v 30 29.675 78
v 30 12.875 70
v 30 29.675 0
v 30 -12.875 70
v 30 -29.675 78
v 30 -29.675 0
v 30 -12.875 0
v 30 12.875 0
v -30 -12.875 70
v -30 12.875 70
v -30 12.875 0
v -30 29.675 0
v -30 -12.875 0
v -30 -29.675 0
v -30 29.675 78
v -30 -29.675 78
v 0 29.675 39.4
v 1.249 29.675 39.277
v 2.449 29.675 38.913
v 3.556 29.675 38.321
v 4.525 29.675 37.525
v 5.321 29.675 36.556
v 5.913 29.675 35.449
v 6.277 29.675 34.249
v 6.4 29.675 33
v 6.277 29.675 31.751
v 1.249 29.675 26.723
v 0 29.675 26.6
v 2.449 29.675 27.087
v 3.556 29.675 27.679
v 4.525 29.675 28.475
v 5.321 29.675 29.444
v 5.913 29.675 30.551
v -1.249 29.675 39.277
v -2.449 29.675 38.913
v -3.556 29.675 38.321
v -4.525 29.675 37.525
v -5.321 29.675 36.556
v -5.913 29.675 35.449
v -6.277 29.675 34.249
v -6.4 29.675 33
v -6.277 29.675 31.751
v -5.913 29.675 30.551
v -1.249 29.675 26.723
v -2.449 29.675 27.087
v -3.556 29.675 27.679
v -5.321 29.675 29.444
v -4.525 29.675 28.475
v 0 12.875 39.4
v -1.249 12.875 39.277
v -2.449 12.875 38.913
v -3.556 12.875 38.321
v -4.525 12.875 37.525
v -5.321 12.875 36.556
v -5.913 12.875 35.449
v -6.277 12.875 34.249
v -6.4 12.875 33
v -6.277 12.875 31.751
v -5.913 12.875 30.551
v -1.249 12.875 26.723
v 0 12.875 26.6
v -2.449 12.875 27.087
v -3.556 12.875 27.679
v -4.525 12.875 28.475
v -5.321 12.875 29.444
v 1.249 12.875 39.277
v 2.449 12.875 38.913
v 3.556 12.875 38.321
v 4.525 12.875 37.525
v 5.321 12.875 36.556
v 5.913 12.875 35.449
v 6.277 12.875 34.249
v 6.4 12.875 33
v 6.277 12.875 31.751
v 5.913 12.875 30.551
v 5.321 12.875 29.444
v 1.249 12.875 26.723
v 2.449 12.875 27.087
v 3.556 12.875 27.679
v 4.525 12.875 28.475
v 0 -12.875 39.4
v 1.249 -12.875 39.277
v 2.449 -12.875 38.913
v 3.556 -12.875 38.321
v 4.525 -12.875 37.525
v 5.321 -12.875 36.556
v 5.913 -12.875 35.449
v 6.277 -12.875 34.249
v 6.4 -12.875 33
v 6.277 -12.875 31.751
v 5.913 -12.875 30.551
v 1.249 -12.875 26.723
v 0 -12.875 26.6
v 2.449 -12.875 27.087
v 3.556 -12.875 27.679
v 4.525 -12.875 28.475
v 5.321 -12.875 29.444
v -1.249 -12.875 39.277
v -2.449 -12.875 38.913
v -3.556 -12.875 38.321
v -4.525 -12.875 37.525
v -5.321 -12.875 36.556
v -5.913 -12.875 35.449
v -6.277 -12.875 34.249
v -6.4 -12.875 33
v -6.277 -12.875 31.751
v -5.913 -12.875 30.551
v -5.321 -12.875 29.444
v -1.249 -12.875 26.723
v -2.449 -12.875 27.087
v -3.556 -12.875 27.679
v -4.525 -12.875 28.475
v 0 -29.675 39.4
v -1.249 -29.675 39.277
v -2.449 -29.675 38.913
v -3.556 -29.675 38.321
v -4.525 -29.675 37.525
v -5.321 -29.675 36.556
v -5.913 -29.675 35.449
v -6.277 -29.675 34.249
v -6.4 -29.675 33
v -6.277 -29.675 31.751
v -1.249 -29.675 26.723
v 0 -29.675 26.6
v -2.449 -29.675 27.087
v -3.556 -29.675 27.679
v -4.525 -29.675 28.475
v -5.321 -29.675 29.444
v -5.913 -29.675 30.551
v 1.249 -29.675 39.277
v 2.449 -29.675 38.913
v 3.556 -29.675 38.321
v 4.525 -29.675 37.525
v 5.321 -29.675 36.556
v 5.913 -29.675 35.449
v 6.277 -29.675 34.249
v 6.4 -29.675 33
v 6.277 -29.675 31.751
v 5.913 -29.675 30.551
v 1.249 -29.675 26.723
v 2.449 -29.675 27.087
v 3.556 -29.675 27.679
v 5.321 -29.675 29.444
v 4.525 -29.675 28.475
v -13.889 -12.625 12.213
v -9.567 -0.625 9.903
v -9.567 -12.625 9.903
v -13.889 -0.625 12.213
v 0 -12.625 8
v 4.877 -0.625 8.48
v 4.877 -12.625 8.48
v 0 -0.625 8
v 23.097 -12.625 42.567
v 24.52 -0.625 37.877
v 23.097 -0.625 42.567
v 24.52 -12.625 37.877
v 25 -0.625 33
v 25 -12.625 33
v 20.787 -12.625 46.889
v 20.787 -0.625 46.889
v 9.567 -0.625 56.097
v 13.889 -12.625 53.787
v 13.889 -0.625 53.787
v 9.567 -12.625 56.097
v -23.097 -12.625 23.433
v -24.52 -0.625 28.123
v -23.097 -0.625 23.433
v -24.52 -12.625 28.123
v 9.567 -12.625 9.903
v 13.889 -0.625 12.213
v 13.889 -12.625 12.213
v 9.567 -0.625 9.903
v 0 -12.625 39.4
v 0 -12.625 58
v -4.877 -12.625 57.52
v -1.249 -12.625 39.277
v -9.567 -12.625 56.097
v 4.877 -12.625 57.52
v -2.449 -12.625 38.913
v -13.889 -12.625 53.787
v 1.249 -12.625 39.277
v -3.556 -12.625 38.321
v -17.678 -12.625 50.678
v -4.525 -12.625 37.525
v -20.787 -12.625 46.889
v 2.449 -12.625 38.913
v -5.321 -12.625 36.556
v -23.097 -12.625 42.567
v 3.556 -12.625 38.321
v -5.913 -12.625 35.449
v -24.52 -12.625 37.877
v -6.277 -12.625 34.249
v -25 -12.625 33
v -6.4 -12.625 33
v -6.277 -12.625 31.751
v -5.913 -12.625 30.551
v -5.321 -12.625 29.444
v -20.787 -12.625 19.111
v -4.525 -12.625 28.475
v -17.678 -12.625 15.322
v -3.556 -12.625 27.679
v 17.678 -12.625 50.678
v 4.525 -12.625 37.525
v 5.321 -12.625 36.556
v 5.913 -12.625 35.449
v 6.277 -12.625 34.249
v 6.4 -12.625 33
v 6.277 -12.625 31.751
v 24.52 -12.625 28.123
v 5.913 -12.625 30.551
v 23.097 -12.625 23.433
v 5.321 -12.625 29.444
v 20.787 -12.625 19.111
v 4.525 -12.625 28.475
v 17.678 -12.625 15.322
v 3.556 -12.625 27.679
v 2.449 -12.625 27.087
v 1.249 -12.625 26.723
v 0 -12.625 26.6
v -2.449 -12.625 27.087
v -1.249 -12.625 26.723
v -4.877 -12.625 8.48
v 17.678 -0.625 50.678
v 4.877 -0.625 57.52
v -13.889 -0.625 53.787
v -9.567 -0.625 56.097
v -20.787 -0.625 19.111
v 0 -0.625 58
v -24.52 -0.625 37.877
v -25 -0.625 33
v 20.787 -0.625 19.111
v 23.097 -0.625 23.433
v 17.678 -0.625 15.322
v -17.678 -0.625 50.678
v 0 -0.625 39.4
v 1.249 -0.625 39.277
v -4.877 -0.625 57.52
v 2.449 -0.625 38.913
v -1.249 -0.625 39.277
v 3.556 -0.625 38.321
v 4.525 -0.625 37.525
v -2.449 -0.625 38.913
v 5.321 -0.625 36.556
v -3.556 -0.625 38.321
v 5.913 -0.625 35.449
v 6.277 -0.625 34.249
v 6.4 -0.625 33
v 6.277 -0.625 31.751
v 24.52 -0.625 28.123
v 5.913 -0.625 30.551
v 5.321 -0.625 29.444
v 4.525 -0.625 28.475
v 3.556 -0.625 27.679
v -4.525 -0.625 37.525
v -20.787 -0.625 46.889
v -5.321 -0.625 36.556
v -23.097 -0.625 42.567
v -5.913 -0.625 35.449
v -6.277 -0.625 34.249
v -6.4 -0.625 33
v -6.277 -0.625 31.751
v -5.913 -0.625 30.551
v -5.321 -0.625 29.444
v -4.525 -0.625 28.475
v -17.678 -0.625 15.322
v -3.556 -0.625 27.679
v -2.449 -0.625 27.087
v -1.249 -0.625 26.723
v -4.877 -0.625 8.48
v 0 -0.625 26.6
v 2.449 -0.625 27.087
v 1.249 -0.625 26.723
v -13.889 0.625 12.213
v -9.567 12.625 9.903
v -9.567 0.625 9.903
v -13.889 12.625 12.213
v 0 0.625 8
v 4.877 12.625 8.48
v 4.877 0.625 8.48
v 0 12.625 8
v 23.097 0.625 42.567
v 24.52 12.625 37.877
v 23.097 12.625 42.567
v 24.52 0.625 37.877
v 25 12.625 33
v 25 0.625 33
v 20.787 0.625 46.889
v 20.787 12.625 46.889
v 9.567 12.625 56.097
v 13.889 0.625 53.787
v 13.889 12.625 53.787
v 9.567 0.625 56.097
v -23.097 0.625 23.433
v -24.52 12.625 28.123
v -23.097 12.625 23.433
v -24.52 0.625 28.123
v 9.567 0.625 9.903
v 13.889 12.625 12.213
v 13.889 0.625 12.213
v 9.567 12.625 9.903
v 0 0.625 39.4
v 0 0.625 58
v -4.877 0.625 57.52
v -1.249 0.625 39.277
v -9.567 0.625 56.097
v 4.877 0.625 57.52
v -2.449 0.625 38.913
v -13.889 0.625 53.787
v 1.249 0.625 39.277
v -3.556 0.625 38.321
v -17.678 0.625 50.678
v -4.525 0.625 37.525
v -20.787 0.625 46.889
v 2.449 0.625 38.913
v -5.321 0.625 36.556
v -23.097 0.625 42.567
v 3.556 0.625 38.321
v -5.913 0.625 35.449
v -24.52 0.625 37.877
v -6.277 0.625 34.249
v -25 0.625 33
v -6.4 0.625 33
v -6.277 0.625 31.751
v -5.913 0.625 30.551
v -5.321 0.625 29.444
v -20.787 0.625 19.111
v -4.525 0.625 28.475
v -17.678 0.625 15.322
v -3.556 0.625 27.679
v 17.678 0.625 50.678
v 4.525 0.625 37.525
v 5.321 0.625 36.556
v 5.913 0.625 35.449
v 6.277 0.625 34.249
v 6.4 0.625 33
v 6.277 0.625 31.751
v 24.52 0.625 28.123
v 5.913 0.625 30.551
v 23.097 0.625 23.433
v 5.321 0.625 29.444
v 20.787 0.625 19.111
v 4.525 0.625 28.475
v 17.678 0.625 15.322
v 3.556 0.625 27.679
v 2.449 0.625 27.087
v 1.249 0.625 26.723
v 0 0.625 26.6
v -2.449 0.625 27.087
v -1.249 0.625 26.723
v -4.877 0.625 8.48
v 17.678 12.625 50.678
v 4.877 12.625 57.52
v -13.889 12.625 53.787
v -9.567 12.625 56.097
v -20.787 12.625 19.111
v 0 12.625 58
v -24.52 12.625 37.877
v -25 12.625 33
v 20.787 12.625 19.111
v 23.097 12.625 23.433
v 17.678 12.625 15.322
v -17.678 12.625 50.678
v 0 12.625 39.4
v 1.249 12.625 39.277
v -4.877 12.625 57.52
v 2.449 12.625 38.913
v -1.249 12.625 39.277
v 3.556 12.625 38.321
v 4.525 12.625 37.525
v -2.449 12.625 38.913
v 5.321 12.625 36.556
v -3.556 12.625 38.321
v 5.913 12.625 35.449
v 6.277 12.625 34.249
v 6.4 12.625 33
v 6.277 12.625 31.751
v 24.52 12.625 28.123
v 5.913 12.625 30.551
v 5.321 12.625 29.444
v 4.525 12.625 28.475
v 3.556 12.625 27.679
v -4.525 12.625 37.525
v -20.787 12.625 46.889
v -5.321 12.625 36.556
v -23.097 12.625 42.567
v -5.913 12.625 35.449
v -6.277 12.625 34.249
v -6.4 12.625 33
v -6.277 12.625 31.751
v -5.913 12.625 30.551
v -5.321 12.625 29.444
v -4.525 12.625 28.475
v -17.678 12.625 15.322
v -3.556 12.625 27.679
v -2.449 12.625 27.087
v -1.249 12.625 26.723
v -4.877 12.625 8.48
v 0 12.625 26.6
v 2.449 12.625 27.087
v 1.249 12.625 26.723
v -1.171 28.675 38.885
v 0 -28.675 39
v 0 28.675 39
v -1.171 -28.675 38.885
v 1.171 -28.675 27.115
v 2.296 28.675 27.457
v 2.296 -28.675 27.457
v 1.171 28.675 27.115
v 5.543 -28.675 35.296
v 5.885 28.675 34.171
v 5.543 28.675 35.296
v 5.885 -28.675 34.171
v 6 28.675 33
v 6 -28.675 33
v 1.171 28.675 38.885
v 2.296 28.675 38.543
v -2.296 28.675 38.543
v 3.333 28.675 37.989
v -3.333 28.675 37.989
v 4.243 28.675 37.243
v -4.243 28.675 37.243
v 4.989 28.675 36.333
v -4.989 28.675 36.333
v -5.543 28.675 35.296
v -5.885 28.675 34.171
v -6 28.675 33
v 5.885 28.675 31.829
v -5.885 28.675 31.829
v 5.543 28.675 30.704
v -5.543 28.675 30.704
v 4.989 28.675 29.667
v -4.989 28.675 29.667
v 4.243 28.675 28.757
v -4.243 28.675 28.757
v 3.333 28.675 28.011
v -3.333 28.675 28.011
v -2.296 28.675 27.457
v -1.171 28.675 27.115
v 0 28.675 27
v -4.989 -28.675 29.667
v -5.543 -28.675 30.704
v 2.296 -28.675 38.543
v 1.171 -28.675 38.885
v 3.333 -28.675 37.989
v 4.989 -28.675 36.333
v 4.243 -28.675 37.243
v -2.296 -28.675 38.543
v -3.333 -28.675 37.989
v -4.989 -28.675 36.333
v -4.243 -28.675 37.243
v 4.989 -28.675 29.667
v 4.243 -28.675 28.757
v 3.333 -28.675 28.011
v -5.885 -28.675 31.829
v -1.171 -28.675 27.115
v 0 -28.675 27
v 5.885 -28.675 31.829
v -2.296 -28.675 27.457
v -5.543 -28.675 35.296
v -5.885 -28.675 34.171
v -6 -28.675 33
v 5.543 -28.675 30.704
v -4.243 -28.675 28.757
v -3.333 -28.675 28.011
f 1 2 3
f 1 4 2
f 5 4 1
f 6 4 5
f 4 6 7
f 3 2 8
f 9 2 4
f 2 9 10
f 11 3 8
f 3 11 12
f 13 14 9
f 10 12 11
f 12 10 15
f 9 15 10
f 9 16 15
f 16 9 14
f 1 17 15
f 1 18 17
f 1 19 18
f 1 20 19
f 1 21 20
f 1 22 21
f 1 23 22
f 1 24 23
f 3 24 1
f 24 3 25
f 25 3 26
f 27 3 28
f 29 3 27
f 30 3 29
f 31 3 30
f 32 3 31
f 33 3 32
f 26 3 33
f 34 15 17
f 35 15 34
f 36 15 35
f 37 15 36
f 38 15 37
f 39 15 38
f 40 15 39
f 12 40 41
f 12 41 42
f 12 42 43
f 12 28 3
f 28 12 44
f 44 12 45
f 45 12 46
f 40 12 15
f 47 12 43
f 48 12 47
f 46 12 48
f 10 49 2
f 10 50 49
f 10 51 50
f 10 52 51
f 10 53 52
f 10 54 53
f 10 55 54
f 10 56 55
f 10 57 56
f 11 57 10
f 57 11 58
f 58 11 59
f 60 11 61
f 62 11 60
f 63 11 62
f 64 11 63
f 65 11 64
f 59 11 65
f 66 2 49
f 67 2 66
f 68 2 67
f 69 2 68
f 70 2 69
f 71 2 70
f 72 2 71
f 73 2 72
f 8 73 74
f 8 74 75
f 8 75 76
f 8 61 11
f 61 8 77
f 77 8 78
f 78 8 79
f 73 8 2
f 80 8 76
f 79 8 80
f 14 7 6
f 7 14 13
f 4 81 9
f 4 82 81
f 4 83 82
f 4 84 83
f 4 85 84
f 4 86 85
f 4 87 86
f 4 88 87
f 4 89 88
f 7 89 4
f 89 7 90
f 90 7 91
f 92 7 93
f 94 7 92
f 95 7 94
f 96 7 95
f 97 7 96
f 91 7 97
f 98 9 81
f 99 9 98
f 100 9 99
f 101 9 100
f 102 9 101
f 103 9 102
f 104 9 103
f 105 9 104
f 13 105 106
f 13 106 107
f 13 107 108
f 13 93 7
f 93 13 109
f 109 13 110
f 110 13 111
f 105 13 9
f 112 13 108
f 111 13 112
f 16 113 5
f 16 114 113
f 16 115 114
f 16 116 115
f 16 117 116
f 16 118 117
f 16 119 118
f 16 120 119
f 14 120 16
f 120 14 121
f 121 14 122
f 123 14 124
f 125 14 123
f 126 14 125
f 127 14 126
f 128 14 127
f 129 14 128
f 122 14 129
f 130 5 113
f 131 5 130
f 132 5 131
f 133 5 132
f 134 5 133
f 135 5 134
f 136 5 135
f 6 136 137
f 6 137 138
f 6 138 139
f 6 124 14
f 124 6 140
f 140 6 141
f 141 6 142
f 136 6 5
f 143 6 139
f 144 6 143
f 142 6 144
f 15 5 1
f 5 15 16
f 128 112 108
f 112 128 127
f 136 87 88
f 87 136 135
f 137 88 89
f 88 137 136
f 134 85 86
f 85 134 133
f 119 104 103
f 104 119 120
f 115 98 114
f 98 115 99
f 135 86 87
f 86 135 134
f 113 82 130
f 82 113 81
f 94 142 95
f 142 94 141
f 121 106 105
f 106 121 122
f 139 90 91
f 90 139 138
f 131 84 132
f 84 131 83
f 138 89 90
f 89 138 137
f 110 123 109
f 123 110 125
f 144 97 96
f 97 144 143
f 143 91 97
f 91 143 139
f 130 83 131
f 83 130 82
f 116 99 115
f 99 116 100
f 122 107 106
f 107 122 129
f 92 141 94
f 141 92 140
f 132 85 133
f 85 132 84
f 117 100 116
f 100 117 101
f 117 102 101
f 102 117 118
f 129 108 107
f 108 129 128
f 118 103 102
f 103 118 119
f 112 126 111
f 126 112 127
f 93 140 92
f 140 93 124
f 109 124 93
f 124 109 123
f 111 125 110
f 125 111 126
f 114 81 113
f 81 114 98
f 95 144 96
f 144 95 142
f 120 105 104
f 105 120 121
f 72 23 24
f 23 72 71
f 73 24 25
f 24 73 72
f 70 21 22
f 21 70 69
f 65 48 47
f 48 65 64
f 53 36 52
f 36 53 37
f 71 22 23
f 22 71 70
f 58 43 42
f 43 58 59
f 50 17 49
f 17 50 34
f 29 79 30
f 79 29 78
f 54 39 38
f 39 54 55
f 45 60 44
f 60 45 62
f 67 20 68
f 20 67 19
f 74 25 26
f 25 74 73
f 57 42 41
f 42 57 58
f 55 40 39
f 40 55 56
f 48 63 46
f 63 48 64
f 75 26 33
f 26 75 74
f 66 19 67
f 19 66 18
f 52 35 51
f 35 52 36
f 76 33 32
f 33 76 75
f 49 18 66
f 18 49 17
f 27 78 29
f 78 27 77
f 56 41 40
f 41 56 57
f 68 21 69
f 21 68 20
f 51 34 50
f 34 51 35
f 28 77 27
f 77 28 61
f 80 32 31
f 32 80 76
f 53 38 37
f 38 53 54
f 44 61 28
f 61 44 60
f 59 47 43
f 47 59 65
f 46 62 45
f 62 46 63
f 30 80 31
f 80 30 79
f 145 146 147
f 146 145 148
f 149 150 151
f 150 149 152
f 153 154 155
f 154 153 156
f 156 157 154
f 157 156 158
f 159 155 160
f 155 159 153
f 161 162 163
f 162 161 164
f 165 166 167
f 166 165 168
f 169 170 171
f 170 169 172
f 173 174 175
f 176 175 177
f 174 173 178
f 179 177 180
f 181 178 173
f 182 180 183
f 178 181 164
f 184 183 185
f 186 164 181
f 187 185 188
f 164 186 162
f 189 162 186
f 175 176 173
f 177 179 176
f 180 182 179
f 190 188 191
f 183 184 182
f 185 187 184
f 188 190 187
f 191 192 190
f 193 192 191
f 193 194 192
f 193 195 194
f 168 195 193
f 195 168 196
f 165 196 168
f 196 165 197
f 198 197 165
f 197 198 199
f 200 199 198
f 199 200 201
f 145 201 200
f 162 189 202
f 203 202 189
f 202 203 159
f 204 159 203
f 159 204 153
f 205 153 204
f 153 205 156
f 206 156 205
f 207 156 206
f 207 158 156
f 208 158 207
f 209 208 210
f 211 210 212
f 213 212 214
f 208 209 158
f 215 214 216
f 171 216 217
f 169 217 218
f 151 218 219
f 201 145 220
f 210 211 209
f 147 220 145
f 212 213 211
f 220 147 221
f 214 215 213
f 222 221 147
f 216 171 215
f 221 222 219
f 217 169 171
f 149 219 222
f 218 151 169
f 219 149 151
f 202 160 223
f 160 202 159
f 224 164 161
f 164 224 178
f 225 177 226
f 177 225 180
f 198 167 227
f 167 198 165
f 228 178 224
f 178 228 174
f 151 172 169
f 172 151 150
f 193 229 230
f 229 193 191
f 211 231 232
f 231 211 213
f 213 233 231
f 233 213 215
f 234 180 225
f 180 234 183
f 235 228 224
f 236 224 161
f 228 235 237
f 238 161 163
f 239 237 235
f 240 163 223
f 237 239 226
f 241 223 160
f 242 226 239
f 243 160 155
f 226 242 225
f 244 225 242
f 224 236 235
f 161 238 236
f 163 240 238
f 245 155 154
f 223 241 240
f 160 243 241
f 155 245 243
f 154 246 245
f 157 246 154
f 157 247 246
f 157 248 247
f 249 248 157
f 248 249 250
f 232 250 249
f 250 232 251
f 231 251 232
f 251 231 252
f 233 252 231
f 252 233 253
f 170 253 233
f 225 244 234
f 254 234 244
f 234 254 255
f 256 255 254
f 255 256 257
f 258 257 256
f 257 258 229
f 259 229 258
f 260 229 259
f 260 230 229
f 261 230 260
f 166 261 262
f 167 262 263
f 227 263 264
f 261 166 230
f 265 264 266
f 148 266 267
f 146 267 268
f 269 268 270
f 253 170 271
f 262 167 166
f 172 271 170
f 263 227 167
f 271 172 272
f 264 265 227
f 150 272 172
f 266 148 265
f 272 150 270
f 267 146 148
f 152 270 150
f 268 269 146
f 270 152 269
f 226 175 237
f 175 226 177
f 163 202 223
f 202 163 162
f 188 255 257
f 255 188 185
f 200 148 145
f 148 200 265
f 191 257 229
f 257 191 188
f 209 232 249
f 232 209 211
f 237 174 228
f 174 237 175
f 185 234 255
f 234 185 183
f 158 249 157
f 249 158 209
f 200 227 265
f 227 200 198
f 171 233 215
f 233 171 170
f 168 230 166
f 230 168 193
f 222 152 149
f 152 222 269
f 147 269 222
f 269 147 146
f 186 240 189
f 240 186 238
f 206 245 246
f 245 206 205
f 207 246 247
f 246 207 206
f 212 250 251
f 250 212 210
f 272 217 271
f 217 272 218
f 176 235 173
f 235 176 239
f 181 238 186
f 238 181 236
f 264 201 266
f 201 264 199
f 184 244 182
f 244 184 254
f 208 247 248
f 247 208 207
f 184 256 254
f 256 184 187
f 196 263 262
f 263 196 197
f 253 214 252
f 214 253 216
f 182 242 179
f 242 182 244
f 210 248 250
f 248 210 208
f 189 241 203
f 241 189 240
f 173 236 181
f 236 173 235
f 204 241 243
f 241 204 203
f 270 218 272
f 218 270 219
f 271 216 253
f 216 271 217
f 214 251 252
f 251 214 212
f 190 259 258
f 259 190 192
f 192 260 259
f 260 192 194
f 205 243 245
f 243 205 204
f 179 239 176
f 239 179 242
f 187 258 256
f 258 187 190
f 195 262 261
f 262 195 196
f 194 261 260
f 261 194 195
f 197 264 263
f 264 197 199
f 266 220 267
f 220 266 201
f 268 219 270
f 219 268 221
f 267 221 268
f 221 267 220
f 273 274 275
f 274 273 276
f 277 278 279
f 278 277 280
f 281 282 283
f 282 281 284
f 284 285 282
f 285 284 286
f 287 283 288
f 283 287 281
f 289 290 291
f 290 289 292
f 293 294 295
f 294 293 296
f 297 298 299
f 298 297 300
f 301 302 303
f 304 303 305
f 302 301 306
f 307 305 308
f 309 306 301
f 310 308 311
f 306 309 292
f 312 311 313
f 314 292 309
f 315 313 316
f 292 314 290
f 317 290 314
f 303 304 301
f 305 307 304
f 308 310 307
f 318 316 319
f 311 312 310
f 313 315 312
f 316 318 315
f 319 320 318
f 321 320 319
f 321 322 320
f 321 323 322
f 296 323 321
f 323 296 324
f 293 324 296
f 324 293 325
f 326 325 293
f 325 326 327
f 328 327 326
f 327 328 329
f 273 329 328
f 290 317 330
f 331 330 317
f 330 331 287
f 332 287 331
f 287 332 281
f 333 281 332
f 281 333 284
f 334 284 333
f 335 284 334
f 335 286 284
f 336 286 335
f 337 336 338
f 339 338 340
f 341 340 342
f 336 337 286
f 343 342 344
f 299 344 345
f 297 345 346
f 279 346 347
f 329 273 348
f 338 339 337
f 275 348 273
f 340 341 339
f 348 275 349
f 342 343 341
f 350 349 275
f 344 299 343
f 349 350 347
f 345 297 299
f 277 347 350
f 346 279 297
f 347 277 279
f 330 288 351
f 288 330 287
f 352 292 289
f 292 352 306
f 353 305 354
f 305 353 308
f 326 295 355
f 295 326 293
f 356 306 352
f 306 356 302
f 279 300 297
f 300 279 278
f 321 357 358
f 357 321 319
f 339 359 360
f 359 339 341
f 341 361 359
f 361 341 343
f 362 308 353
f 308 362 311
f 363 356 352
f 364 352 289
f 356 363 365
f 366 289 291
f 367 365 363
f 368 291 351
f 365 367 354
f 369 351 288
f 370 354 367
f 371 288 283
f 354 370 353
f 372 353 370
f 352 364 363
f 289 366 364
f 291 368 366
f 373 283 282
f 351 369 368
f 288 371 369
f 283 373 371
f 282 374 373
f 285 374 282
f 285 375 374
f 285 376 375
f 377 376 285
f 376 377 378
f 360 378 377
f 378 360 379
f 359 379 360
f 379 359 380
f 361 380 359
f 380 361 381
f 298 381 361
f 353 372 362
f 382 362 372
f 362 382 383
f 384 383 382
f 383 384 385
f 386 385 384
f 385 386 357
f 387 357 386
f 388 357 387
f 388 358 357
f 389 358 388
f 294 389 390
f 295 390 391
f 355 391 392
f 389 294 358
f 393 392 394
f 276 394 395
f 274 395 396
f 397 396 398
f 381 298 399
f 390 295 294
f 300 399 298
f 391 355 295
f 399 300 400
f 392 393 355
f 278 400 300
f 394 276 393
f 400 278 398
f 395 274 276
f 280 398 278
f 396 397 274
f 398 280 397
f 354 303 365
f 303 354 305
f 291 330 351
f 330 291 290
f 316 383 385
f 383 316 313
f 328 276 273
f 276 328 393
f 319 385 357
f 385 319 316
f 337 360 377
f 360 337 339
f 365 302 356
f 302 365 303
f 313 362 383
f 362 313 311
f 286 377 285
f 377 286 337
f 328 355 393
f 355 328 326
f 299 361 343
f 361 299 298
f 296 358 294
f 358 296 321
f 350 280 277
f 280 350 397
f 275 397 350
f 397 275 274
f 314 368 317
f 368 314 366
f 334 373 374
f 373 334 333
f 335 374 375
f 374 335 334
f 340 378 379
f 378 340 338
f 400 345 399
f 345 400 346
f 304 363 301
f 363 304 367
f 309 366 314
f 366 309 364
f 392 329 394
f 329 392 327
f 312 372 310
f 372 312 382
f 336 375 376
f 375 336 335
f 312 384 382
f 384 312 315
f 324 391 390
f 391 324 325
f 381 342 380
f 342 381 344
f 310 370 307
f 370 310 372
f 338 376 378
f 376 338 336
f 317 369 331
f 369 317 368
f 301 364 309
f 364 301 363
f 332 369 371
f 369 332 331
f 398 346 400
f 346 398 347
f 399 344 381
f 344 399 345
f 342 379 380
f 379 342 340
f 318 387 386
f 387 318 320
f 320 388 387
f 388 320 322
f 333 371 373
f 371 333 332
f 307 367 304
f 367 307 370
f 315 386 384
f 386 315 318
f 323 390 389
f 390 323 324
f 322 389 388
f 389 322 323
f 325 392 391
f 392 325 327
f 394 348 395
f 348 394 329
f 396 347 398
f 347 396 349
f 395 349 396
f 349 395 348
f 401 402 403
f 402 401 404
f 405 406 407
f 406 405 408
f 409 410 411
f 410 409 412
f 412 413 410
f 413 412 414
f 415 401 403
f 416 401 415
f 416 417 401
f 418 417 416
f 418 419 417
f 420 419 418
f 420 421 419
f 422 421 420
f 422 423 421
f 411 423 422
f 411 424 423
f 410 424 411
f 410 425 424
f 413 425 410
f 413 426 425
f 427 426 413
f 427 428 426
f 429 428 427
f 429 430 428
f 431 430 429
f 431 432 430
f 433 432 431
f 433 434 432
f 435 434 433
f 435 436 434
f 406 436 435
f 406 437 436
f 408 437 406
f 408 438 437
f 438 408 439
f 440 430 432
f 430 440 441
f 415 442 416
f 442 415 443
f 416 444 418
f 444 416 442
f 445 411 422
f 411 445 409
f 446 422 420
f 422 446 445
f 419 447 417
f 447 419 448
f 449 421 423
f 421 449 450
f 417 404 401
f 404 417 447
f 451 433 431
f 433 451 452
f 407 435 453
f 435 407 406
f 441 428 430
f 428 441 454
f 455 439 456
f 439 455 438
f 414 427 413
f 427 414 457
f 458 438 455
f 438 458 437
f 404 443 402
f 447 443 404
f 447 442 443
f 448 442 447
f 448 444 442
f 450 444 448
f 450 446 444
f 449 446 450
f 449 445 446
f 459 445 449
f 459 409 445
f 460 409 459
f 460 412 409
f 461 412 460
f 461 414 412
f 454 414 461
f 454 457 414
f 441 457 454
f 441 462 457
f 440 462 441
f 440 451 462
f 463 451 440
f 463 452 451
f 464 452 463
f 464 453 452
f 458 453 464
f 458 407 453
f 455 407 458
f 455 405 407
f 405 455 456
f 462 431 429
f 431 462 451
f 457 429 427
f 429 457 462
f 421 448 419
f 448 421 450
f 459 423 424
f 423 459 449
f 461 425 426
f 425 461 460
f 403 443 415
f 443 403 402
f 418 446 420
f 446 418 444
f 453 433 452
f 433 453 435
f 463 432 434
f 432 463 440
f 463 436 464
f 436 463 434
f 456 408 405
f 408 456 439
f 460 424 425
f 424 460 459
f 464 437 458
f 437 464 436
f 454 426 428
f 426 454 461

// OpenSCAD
$fn = 32;

// ------------------------------------------------------------------------
// Trolley wheel set: wheels d50, fork 70 mm tall
// Every part is its own module, assembly() places every instance.
// ------------------------------------------------------------------------

// --- part 1 ---
module trolley_fork() {
  difference() {
    union() {
      translate([-30, 12.875, 0]) cube([60, 16.8, 70]);
      translate([-30, -29.675, 0]) cube([60, 16.8, 70]);
      translate([-30, -29.675, 70]) cube([60, 59.35, 8]);
    }
    translate([0, -21.275, 33]) rotate([90, 0, 0]) cylinder(h = 18.8, d = 12.8, center = true);
    translate([0, 21.275, 33]) rotate([90, 0, 0]) cylinder(h = 18.8, d = 12.8, center = true);
  }
}

// --- part 2 ---
module trolley_wheel() {
  difference() {
      translate([0, 0, 0]) cylinder(h = 12, d = 50);
      translate([0, 0, -1]) cylinder(h = 14, d = 12.8);
    }
}

// --- part 3 ---
module trolley_axle() {
  translate([0, 0, -28.675]) cylinder(h = 57.35, d = 12);
}

// --- assembly ---
module assembly() {
  color([0.80, 0.24, 0.20]) translate([0, 0, 0]) rotate([0, 0, 0]) trolley_fork();
  color([0.20, 0.45, 0.75]) translate([0, -0.625, 33]) rotate([90, 0, 0]) trolley_wheel();
  color([0.25, 0.62, 0.32]) translate([0, 12.625, 33]) rotate([90, 0, 0]) trolley_wheel();
  color([0.92, 0.70, 0.18]) translate([0, 0, 33]) rotate([90, 0, 0]) trolley_axle();
}

assembly();
